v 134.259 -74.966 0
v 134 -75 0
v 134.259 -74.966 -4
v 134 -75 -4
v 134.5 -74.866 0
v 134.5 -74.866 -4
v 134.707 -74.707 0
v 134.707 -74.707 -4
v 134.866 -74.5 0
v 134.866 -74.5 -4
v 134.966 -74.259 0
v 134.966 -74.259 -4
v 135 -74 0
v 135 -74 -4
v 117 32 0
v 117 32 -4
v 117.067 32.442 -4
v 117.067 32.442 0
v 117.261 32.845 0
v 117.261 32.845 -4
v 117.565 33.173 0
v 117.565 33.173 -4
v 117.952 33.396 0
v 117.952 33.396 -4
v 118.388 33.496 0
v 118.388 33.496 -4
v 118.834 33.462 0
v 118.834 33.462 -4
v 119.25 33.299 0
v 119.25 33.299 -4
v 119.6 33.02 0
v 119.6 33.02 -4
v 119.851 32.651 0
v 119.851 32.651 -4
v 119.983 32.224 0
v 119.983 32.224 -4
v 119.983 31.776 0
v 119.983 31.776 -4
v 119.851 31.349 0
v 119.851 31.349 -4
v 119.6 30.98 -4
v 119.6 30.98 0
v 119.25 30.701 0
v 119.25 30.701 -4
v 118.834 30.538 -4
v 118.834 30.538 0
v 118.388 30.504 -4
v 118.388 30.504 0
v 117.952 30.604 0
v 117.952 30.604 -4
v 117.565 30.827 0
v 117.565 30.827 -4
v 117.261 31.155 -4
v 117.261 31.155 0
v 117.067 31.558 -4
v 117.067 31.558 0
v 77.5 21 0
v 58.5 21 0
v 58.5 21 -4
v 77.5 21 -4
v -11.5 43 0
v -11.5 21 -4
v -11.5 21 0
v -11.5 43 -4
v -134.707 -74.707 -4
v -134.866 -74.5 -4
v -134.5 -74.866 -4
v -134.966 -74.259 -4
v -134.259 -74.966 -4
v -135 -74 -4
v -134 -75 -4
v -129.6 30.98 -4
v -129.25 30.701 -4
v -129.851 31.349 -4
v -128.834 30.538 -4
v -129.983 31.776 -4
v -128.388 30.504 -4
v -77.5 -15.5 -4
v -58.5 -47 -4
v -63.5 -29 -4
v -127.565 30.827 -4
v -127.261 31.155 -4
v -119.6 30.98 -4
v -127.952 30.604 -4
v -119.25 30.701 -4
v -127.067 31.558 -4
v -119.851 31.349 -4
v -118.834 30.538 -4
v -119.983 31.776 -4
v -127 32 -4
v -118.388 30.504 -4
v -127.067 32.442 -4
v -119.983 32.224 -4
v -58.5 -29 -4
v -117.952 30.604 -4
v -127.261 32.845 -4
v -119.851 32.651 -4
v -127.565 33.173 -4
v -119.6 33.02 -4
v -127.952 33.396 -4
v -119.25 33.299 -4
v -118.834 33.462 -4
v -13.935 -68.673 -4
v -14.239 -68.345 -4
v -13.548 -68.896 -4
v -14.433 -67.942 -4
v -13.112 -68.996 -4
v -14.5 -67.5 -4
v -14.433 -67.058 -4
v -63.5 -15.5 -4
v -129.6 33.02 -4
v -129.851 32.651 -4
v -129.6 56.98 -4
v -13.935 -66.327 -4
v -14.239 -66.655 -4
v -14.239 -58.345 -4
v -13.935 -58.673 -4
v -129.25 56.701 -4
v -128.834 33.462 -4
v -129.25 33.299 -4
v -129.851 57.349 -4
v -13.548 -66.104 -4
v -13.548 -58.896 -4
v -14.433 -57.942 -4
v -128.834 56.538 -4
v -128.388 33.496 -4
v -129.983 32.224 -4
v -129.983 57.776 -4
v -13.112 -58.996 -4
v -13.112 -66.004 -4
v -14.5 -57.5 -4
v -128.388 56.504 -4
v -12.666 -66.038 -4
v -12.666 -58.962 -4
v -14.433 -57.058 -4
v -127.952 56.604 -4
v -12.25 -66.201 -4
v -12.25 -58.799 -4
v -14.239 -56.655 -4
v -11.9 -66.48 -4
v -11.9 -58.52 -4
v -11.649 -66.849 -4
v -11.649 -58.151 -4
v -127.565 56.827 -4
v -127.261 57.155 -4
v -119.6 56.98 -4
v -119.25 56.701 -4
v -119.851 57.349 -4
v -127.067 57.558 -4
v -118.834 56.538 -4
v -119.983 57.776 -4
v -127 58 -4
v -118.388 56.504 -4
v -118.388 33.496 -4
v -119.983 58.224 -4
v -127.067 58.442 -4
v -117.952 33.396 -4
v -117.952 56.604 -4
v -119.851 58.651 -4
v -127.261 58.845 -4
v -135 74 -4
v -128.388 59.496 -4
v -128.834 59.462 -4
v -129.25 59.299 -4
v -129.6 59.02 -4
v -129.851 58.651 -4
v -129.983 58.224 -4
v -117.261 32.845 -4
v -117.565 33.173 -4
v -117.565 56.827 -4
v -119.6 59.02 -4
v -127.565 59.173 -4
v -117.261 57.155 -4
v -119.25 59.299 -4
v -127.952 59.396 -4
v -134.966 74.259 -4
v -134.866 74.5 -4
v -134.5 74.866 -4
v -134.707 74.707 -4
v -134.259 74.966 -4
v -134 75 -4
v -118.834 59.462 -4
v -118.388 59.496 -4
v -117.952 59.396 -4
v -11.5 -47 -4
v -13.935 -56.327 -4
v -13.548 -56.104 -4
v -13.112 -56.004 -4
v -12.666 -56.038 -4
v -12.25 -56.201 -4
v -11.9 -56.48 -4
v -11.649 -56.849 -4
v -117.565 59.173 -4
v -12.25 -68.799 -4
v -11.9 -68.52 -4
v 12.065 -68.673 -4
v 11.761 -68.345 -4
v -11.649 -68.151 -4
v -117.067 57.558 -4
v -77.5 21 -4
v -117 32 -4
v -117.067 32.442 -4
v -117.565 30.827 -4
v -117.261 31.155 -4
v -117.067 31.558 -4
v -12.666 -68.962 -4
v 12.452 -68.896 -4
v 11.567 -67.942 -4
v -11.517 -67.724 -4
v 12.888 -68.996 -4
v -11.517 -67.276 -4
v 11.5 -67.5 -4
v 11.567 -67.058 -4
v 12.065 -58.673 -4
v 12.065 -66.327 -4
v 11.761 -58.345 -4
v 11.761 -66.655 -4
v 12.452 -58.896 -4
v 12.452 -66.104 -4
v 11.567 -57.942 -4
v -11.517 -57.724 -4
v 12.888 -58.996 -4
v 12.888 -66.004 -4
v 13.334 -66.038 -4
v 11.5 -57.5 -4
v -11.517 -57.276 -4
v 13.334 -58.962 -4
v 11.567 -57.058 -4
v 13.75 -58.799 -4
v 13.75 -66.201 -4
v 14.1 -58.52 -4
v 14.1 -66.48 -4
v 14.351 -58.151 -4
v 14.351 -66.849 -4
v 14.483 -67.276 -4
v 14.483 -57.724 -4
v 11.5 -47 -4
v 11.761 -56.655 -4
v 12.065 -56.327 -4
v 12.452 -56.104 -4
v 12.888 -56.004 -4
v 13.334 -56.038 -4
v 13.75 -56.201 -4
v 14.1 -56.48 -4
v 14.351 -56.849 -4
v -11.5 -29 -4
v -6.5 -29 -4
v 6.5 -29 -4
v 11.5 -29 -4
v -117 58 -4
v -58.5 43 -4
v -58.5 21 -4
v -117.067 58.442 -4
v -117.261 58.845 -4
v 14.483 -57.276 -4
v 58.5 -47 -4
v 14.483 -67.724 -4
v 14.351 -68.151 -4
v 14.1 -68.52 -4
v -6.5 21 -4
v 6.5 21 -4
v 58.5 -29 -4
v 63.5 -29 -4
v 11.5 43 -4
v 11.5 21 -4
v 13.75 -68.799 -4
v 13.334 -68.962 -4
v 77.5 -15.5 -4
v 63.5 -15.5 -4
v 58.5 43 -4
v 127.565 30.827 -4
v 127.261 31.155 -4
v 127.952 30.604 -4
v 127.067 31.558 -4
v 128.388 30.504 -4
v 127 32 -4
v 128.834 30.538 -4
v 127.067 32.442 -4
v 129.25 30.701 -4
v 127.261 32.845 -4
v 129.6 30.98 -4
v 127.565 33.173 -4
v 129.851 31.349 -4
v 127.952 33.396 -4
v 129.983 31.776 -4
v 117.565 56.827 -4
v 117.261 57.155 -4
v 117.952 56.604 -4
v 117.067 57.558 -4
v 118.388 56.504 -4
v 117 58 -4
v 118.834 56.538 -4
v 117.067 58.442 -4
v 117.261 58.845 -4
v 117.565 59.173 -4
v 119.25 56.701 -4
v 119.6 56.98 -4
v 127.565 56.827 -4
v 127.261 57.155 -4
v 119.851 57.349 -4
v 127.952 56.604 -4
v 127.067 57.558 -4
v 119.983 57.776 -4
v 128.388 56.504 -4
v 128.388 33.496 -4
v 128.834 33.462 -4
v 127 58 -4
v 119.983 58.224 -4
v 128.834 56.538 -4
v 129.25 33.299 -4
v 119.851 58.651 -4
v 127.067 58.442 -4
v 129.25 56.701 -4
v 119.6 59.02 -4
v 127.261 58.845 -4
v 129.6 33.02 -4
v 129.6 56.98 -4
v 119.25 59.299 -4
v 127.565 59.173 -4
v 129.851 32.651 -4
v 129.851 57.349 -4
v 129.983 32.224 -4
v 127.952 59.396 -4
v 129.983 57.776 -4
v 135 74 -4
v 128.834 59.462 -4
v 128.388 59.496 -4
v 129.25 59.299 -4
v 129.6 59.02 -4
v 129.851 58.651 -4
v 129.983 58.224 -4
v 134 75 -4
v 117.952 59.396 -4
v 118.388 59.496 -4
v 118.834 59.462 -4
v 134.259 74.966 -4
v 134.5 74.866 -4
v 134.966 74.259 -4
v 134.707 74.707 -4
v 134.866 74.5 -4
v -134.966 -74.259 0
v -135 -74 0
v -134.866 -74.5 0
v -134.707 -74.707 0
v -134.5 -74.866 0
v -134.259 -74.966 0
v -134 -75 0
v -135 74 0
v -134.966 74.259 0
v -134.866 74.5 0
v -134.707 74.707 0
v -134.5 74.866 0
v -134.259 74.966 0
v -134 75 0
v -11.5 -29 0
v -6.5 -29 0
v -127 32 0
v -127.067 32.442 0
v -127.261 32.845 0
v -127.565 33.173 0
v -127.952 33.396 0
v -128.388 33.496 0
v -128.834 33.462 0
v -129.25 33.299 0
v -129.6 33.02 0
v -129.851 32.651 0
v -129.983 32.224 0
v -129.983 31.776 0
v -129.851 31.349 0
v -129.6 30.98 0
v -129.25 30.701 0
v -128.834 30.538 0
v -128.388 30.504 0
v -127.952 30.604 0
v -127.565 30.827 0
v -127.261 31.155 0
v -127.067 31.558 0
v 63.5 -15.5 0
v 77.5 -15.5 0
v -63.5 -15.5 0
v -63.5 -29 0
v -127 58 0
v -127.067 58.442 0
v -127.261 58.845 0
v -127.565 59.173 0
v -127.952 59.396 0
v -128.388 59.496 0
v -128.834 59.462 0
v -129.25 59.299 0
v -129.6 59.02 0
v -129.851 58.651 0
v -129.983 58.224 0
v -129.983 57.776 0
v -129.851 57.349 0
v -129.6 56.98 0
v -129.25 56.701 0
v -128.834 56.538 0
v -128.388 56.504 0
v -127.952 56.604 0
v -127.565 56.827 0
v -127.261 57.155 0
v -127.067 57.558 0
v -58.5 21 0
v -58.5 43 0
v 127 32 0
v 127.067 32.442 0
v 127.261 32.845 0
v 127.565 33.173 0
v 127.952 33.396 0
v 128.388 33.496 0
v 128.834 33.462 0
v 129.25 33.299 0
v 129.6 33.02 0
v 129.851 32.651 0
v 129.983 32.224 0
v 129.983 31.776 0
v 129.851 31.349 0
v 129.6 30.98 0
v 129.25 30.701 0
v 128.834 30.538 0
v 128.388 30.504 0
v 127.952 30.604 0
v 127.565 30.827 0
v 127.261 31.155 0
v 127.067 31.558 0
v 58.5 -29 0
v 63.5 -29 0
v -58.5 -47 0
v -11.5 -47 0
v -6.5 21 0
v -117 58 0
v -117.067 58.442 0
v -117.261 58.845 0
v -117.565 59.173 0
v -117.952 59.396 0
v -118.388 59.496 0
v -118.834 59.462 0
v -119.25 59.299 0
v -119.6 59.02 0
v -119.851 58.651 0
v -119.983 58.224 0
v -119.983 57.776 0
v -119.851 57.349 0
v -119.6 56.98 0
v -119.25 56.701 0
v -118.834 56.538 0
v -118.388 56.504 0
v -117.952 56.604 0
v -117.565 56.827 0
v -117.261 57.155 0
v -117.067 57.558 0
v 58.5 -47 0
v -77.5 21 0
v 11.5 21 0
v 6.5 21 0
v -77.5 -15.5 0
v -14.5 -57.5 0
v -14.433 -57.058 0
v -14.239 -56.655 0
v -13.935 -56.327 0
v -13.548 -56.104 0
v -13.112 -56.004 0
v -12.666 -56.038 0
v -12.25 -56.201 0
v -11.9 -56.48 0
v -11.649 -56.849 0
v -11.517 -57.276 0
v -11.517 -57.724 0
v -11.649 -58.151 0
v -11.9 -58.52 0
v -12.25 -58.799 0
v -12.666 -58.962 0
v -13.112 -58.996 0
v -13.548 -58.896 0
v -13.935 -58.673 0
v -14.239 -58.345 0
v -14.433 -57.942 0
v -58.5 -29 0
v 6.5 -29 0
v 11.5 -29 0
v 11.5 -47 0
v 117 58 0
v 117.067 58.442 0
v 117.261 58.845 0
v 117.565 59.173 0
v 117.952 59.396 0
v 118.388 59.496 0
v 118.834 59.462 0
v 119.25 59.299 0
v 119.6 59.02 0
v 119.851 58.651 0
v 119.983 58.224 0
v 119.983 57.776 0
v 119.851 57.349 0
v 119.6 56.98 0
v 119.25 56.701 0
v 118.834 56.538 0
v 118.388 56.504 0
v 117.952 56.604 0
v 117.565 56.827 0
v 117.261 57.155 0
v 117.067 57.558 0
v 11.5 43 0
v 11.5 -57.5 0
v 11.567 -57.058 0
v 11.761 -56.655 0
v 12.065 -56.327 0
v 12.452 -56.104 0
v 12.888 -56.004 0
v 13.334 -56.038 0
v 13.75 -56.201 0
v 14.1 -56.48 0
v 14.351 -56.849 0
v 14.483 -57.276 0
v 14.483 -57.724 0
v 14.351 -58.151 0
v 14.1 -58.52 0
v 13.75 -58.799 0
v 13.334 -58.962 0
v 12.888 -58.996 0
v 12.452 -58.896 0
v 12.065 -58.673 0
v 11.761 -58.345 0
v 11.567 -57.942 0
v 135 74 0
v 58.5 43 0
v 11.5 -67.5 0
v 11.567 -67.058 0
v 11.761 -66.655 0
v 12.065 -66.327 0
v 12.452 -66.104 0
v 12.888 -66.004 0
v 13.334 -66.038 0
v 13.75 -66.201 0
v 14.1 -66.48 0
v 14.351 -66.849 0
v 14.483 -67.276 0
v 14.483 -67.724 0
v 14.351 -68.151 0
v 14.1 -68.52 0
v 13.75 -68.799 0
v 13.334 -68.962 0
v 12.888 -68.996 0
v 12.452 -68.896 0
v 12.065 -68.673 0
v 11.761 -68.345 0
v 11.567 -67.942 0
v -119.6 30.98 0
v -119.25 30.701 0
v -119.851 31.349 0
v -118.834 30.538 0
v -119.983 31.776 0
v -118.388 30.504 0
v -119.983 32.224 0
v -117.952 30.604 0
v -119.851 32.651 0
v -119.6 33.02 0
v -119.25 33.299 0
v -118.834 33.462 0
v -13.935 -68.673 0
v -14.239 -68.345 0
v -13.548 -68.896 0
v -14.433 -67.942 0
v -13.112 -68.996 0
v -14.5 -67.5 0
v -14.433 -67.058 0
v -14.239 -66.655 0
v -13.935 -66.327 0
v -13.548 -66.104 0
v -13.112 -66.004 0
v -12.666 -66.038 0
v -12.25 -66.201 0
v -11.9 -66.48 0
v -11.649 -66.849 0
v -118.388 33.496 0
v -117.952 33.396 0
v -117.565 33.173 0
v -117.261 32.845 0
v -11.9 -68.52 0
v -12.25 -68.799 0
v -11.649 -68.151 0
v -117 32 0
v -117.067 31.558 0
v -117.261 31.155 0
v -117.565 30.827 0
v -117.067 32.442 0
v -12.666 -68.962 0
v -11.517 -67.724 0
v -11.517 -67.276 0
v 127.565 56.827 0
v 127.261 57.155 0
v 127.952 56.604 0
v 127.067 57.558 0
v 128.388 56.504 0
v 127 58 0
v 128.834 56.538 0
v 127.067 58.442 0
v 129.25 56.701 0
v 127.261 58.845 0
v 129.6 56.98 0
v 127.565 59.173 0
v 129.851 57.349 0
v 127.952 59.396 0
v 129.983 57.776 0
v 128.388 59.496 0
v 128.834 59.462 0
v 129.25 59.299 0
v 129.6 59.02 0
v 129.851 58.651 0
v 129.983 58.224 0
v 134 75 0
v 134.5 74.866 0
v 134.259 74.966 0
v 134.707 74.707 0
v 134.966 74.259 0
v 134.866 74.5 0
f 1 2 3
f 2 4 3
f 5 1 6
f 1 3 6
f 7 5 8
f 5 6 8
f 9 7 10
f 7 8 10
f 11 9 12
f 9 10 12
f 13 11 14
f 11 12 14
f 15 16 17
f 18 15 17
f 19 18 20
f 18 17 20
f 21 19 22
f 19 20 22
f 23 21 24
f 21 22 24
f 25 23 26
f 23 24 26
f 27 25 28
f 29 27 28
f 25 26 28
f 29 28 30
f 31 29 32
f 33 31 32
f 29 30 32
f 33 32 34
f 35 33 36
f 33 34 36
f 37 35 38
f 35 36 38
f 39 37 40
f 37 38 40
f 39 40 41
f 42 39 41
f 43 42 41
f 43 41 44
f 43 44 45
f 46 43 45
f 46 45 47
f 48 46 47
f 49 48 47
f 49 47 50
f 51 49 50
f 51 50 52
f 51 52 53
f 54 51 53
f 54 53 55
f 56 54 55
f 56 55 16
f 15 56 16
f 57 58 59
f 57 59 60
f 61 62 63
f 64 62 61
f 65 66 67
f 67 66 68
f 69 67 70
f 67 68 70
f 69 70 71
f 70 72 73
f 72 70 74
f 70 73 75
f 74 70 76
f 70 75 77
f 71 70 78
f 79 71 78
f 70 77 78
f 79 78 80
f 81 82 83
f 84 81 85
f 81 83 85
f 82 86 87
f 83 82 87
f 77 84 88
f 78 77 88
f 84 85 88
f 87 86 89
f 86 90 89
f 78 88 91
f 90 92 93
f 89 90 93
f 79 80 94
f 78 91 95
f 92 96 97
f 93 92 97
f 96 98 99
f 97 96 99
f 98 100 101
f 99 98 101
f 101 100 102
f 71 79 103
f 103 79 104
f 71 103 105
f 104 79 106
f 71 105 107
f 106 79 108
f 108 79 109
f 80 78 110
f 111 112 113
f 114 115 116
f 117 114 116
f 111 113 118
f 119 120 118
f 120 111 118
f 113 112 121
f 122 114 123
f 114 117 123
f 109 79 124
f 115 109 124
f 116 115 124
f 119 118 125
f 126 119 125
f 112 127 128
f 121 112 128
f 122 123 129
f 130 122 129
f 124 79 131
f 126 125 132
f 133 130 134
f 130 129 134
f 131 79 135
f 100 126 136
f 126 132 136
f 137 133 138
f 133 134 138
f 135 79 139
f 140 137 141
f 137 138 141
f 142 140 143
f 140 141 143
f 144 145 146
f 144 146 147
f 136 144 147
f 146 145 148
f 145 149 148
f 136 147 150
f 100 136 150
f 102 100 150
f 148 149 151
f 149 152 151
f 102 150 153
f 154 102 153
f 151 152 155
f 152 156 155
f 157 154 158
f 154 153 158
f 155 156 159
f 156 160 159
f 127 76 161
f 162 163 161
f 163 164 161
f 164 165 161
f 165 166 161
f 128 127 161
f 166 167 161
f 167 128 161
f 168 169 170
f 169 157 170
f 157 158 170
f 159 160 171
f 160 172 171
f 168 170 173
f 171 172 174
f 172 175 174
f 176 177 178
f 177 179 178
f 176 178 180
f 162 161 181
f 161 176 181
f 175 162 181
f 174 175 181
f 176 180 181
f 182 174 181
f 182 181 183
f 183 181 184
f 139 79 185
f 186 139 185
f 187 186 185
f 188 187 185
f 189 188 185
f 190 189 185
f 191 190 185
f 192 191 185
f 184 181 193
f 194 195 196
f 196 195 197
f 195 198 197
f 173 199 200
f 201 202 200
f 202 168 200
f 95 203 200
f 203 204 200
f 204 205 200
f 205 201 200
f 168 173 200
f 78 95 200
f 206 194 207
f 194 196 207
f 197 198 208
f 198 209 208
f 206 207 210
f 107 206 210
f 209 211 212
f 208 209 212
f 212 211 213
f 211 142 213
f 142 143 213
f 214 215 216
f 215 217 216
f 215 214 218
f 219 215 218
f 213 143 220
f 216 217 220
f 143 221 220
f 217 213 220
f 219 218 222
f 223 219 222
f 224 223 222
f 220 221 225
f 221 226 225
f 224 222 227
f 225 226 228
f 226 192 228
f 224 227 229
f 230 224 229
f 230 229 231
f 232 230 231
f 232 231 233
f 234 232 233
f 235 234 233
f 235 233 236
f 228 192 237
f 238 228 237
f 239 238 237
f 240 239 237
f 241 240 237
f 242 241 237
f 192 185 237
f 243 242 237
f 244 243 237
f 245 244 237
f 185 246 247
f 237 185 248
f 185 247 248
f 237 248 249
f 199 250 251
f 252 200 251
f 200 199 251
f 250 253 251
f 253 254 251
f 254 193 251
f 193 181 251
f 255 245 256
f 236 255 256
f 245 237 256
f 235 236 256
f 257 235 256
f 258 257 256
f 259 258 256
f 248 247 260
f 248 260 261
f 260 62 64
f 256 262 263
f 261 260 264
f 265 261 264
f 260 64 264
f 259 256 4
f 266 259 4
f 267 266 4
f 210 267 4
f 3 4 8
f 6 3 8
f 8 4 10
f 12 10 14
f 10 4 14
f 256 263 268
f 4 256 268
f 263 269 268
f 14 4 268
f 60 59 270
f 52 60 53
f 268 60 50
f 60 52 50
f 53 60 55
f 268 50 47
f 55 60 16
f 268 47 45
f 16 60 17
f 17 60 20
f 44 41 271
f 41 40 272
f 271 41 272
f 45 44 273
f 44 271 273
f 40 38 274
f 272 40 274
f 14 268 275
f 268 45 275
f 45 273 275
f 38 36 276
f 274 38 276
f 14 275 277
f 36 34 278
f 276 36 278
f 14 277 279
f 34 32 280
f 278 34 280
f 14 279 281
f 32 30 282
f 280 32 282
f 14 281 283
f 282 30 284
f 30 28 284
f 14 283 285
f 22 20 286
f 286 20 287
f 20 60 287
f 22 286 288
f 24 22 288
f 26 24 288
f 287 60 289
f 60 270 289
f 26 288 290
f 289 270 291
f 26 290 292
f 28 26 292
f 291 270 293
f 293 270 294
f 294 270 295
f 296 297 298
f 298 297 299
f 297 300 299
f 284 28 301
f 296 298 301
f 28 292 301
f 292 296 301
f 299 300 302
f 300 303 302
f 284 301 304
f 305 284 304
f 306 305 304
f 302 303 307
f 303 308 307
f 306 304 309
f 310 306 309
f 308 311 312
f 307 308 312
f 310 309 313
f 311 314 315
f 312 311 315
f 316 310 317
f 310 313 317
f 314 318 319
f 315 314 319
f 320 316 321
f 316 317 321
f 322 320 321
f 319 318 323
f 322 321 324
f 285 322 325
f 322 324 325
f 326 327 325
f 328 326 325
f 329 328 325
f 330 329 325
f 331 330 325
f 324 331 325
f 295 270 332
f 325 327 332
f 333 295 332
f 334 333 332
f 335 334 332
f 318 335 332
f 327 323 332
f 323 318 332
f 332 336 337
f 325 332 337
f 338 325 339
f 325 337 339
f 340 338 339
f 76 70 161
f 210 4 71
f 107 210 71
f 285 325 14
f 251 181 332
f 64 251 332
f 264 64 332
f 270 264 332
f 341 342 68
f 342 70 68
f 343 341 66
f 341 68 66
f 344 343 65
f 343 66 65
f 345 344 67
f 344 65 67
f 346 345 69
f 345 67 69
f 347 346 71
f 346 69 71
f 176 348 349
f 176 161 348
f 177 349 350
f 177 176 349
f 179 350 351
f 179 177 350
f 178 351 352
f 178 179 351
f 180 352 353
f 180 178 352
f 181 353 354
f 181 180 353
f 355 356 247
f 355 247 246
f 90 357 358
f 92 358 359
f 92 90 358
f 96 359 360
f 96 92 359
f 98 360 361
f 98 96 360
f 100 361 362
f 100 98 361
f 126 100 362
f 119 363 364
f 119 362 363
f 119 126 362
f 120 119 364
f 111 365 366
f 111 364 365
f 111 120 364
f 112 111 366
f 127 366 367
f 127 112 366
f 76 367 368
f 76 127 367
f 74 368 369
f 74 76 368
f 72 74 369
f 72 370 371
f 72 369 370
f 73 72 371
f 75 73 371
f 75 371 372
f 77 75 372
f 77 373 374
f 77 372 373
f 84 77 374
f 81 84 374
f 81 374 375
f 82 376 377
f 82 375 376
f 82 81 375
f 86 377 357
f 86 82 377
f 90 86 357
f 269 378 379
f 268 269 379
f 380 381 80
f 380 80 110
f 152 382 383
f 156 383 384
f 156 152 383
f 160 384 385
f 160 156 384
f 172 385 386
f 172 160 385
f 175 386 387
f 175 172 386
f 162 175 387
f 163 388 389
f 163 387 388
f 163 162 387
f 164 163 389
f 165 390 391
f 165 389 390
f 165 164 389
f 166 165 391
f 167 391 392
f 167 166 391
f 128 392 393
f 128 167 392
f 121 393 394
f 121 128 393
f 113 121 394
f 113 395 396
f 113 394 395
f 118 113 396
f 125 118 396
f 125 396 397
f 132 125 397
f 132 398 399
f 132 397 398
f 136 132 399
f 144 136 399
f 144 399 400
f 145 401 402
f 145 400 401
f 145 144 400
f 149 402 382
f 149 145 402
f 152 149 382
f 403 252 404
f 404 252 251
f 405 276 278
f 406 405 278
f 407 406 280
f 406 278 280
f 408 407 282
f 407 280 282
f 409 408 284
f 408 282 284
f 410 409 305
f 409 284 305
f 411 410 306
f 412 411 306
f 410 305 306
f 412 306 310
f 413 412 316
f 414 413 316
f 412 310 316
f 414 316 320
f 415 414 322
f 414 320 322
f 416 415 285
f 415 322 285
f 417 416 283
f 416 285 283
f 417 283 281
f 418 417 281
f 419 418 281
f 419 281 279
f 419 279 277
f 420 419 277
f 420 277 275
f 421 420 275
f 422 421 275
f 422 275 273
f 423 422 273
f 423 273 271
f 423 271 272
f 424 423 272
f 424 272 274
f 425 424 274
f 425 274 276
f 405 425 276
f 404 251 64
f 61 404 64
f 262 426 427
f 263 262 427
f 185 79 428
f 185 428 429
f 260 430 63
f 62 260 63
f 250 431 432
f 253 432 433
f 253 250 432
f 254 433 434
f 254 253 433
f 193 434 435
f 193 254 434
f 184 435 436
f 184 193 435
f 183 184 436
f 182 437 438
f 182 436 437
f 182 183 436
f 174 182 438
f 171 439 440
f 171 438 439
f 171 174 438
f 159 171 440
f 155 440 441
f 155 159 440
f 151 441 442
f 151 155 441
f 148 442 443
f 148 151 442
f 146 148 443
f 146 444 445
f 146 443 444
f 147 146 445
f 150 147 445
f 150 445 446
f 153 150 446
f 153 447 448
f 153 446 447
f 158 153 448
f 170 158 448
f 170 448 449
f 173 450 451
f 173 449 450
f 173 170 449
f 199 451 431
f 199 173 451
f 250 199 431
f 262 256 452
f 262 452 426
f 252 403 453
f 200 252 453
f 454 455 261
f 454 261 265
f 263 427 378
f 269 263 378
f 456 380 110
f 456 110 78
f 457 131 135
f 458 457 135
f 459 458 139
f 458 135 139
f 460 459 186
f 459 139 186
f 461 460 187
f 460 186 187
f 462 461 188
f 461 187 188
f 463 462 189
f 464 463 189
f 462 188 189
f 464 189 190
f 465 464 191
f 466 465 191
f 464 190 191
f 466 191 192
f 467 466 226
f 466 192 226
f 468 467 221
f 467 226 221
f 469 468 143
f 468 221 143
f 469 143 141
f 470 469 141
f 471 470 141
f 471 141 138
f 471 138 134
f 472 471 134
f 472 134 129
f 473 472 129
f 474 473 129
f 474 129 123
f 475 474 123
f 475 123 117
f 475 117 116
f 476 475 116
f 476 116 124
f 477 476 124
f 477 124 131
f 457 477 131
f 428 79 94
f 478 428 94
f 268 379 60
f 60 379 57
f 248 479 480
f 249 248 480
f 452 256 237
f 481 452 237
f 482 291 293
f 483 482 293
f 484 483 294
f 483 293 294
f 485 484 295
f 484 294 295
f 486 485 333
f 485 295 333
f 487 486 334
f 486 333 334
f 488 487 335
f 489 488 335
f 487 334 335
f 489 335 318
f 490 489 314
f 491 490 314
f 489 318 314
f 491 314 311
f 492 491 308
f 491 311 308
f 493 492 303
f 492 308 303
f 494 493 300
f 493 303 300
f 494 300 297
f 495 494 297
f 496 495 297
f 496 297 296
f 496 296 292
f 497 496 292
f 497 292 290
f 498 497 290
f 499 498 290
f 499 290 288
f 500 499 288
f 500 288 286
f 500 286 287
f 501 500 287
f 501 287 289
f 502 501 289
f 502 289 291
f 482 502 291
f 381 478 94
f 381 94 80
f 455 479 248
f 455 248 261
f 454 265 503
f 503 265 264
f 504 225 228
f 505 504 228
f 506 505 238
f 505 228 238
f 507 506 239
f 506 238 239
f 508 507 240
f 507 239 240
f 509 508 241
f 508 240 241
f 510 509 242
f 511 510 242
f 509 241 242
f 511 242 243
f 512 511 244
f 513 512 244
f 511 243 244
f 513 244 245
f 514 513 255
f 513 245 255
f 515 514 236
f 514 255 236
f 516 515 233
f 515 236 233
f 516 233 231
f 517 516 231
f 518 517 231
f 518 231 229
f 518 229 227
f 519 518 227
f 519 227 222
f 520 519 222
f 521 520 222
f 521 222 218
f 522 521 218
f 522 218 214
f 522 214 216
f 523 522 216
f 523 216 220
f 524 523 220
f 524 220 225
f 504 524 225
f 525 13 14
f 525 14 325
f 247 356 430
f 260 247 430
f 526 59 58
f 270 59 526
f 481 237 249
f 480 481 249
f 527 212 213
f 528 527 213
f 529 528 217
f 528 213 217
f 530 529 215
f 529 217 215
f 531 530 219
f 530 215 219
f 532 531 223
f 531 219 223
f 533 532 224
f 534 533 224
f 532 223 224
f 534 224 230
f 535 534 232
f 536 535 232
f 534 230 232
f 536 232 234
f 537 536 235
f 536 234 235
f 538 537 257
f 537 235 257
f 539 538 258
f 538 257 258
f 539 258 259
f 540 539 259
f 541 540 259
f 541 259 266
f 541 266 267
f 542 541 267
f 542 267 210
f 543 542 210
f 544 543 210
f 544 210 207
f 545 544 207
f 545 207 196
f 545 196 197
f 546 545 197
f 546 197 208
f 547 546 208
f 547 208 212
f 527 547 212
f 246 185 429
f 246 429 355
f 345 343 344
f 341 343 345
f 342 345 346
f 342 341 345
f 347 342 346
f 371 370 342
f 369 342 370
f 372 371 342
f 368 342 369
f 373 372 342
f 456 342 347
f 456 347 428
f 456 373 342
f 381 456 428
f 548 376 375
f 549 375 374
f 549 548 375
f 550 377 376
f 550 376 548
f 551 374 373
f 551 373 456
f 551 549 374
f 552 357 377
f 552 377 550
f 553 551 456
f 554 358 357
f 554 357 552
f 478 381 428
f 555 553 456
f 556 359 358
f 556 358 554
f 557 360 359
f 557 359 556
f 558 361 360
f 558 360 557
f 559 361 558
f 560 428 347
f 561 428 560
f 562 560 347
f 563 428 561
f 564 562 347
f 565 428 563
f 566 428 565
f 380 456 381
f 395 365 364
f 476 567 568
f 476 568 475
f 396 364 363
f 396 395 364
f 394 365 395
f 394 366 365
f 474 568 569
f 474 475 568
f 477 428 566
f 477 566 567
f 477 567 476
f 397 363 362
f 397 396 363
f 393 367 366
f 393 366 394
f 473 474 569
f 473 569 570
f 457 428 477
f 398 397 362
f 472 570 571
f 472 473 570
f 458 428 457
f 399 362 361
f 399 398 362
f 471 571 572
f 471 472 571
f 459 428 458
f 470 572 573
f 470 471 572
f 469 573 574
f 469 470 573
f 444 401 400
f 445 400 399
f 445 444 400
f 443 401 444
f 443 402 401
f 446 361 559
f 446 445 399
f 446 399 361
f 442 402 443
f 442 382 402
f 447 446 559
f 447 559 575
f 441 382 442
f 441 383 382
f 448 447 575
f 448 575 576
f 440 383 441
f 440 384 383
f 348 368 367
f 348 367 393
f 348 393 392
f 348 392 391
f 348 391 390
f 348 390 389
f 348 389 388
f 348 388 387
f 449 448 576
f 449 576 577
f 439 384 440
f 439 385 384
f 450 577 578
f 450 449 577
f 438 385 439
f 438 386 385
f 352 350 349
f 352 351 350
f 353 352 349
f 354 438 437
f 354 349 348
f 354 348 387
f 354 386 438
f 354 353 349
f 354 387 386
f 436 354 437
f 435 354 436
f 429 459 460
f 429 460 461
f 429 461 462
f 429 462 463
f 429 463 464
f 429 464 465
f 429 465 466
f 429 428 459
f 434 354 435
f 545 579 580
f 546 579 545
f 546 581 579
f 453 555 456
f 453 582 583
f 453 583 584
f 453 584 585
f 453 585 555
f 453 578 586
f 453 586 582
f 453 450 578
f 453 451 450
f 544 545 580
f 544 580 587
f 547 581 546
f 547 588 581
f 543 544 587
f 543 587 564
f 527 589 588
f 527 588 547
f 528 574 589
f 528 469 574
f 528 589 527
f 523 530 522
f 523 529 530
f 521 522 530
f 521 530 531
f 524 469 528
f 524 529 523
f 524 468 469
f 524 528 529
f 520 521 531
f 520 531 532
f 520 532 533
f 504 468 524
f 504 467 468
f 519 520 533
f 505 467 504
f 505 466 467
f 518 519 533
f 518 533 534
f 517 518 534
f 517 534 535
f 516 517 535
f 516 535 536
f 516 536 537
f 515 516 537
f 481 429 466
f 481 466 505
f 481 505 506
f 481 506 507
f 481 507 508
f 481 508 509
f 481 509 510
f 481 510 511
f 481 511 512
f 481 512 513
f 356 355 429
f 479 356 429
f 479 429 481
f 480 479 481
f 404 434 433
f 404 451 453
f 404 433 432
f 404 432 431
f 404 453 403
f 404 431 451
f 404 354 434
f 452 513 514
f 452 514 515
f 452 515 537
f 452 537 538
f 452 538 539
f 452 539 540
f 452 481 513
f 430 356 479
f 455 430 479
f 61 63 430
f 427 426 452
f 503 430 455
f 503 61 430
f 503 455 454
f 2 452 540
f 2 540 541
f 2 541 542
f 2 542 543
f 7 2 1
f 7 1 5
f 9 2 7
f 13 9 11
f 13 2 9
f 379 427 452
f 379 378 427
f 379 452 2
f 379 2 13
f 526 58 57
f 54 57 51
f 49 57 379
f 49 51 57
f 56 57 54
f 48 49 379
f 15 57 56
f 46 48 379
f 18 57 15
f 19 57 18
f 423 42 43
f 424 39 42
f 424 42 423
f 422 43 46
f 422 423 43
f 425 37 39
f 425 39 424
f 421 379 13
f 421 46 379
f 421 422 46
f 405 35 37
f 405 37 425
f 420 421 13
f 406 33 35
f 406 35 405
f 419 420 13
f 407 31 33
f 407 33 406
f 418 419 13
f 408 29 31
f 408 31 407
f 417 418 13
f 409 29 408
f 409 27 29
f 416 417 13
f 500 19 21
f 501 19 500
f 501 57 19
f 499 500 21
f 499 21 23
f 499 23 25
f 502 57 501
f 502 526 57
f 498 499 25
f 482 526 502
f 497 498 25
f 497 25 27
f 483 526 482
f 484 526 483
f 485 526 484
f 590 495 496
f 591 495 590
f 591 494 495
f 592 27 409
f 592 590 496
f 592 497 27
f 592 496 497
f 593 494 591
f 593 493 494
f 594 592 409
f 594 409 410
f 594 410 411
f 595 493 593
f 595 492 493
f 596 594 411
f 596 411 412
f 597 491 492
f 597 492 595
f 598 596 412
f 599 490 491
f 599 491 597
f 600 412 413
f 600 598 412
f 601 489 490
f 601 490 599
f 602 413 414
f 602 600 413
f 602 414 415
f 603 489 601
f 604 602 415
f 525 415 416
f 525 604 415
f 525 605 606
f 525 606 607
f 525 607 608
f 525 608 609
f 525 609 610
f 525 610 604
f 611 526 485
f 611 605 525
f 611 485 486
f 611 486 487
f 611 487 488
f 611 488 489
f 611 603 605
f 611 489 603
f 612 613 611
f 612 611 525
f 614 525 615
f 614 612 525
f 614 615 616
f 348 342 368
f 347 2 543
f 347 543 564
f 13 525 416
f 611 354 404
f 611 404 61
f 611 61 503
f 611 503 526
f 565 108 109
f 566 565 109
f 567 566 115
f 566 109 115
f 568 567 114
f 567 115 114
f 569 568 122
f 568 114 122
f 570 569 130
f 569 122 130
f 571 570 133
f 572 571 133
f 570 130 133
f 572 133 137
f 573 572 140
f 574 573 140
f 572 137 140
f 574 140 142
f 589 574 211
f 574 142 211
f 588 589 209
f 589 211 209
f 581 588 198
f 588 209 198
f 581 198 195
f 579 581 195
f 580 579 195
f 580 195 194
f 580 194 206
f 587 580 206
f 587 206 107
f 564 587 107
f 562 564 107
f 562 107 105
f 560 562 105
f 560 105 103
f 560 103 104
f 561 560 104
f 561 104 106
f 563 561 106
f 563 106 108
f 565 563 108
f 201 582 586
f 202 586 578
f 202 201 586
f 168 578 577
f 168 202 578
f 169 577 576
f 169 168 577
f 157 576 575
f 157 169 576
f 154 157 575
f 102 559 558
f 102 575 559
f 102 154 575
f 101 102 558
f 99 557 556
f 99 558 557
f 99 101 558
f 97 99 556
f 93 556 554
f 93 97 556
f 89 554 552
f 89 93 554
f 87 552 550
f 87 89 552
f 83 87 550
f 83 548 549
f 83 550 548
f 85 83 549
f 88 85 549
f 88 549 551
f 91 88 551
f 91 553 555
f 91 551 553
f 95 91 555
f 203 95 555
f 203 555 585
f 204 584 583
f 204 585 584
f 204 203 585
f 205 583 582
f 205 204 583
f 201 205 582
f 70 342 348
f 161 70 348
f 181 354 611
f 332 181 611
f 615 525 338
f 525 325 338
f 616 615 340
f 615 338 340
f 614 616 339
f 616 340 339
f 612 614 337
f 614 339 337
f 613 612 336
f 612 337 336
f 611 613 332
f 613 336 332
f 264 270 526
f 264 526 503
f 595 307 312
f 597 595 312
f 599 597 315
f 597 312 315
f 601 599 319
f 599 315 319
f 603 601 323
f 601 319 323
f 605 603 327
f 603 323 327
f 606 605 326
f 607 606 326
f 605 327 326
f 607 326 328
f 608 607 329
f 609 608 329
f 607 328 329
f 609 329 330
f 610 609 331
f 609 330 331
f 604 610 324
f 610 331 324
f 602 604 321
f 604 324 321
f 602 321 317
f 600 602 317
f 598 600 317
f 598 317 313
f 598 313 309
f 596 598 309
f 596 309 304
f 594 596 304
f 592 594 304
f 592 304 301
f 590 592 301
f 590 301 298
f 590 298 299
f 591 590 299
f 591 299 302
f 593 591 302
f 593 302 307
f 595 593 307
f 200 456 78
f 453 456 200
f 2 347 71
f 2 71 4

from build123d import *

# Parameters (mm, degrees)
SKETCH_1_W             = 270
SKETCH_1_H             = 150
SM_BASE_FLANGE_1_DEPTH = 4
FILLET_1_R             = 1
SKETCH_2_R             = 1.5
CUT_EXTRUDE_1_DEPTH    = 10
SKETCH_3_R             = 1.5
CUT_EXTRUDE_2_DEPTH    = 10
SKETCH_4_W             = 47
SKETCH_4_H             = 90
CUT_EXTRUDE_3_DEPTH    = 10
SKETCH_5_W             = 57
SKETCH_5_H             = 50
CUT_EXTRUDE_4_DEPTH    = 10
SKETCH_6_W             = 14
SKETCH_6_H             = 36.5
CUT_EXTRUDE_5_DEPTH    = 10


# Sheet-metal steps are written as plain solids
with BuildPart() as part:
    # Sketch 1 → 基体-法兰1 (new body)
    with BuildSketch(Plane.XY):
        Rectangle(SKETCH_1_W, SKETCH_1_H)
    extrude(amount=-SM_BASE_FLANGE_1_DEPTH)

    # 圆角1
    fillet_1_edges = [part.edges().sort_by_distance(p)[0] for p in [
        (135, -75, -2),
        (-135, -75, -2),
        (-135, 75, -2),
        (135, 75, -2),
    ]]
    fillet(fillet_1_edges, radius=FILLET_1_R)

    # Sketch 2 → 切除-拉伸1 (cut)
    with BuildSketch(Plane(origin=(0, 0, -4), x_dir=(-1, 0, 0), z_dir=(0, 0, -1))):
        with Locations((-13, -67.5)):
            Circle(SKETCH_2_R)
        with Locations((-13, -57.5)):
            Circle(SKETCH_2_R)
        with Locations((13, -57.5)):
            Circle(SKETCH_2_R)
        with Locations((13, -67.5)):
            Circle(SKETCH_2_R)
    extrude(amount=-CUT_EXTRUDE_1_DEPTH, mode=Mode.SUBTRACT)

    # 草图3 → 切除-拉伸2 (cut)
    with BuildSketch(Plane(origin=(0, 0, -4), x_dir=(-1, 0, 0), z_dir=(0, 0, -1))):
        with Locations((-128.5, 58)):
            Circle(SKETCH_3_R)
        with Locations((-128.5, 32)):
            Circle(SKETCH_3_R)
        with Locations((-118.5, 58)):
            Circle(SKETCH_3_R)
        with Locations((-118.5, 32)):
            Circle(SKETCH_3_R)
    cut_extrude_2 = extrude(amount=-CUT_EXTRUDE_2_DEPTH, mode=Mode.SUBTRACT)

    # 镜向1: 切除-拉伸2 across plane
    add(cut_extrude_2.mirror(Plane(origin=(0, 0, 0), x_dir=(0, 0, 1), z_dir=(1, 0, 0))), mode=Mode.SUBTRACT)

    # 草图4 → 切除-拉伸3 (cut)
    with BuildSketch(Plane(origin=(0, 0, -4), x_dir=(-1, 0, 0), z_dir=(0, 0, -1))):
        with Locations((-35, -2)):
            Rectangle(SKETCH_4_W, SKETCH_4_H)
    cut_extrude_3 = extrude(amount=-CUT_EXTRUDE_3_DEPTH, mode=Mode.SUBTRACT)

    # 草图5 → 切除-拉伸4 (cut)
    with BuildSketch(Plane.XY):
        with Locations((35, -4)):
            Rectangle(SKETCH_5_W, SKETCH_5_H)
    cut_extrude_4 = extrude(amount=-CUT_EXTRUDE_4_DEPTH, mode=Mode.SUBTRACT)

    # 草图6 → 切除-拉伸5 (cut)
    with BuildSketch(Plane.XY):
        with Locations((70.5, 2.75)):
            Rectangle(SKETCH_6_W, SKETCH_6_H)
    cut_extrude_5 = extrude(amount=-CUT_EXTRUDE_5_DEPTH, mode=Mode.SUBTRACT)

    # 镜向2: 切除-拉伸3, 切除-拉伸4, 切除-拉伸5 across plane
    add(cut_extrude_3.mirror(Plane(origin=(0, 0, 0), x_dir=(0, 0, 1), z_dir=(1, 0, 0))), mode=Mode.SUBTRACT)
    add(cut_extrude_4.mirror(Plane(origin=(0, 0, 0), x_dir=(0, 0, 1), z_dir=(1, 0, 0))), mode=Mode.SUBTRACT)
    add(cut_extrude_5.mirror(Plane(origin=(0, 0, 0), x_dir=(0, 0, 1), z_dir=(1, 0, 0))), mode=Mode.SUBTRACT)


solid = part.part
